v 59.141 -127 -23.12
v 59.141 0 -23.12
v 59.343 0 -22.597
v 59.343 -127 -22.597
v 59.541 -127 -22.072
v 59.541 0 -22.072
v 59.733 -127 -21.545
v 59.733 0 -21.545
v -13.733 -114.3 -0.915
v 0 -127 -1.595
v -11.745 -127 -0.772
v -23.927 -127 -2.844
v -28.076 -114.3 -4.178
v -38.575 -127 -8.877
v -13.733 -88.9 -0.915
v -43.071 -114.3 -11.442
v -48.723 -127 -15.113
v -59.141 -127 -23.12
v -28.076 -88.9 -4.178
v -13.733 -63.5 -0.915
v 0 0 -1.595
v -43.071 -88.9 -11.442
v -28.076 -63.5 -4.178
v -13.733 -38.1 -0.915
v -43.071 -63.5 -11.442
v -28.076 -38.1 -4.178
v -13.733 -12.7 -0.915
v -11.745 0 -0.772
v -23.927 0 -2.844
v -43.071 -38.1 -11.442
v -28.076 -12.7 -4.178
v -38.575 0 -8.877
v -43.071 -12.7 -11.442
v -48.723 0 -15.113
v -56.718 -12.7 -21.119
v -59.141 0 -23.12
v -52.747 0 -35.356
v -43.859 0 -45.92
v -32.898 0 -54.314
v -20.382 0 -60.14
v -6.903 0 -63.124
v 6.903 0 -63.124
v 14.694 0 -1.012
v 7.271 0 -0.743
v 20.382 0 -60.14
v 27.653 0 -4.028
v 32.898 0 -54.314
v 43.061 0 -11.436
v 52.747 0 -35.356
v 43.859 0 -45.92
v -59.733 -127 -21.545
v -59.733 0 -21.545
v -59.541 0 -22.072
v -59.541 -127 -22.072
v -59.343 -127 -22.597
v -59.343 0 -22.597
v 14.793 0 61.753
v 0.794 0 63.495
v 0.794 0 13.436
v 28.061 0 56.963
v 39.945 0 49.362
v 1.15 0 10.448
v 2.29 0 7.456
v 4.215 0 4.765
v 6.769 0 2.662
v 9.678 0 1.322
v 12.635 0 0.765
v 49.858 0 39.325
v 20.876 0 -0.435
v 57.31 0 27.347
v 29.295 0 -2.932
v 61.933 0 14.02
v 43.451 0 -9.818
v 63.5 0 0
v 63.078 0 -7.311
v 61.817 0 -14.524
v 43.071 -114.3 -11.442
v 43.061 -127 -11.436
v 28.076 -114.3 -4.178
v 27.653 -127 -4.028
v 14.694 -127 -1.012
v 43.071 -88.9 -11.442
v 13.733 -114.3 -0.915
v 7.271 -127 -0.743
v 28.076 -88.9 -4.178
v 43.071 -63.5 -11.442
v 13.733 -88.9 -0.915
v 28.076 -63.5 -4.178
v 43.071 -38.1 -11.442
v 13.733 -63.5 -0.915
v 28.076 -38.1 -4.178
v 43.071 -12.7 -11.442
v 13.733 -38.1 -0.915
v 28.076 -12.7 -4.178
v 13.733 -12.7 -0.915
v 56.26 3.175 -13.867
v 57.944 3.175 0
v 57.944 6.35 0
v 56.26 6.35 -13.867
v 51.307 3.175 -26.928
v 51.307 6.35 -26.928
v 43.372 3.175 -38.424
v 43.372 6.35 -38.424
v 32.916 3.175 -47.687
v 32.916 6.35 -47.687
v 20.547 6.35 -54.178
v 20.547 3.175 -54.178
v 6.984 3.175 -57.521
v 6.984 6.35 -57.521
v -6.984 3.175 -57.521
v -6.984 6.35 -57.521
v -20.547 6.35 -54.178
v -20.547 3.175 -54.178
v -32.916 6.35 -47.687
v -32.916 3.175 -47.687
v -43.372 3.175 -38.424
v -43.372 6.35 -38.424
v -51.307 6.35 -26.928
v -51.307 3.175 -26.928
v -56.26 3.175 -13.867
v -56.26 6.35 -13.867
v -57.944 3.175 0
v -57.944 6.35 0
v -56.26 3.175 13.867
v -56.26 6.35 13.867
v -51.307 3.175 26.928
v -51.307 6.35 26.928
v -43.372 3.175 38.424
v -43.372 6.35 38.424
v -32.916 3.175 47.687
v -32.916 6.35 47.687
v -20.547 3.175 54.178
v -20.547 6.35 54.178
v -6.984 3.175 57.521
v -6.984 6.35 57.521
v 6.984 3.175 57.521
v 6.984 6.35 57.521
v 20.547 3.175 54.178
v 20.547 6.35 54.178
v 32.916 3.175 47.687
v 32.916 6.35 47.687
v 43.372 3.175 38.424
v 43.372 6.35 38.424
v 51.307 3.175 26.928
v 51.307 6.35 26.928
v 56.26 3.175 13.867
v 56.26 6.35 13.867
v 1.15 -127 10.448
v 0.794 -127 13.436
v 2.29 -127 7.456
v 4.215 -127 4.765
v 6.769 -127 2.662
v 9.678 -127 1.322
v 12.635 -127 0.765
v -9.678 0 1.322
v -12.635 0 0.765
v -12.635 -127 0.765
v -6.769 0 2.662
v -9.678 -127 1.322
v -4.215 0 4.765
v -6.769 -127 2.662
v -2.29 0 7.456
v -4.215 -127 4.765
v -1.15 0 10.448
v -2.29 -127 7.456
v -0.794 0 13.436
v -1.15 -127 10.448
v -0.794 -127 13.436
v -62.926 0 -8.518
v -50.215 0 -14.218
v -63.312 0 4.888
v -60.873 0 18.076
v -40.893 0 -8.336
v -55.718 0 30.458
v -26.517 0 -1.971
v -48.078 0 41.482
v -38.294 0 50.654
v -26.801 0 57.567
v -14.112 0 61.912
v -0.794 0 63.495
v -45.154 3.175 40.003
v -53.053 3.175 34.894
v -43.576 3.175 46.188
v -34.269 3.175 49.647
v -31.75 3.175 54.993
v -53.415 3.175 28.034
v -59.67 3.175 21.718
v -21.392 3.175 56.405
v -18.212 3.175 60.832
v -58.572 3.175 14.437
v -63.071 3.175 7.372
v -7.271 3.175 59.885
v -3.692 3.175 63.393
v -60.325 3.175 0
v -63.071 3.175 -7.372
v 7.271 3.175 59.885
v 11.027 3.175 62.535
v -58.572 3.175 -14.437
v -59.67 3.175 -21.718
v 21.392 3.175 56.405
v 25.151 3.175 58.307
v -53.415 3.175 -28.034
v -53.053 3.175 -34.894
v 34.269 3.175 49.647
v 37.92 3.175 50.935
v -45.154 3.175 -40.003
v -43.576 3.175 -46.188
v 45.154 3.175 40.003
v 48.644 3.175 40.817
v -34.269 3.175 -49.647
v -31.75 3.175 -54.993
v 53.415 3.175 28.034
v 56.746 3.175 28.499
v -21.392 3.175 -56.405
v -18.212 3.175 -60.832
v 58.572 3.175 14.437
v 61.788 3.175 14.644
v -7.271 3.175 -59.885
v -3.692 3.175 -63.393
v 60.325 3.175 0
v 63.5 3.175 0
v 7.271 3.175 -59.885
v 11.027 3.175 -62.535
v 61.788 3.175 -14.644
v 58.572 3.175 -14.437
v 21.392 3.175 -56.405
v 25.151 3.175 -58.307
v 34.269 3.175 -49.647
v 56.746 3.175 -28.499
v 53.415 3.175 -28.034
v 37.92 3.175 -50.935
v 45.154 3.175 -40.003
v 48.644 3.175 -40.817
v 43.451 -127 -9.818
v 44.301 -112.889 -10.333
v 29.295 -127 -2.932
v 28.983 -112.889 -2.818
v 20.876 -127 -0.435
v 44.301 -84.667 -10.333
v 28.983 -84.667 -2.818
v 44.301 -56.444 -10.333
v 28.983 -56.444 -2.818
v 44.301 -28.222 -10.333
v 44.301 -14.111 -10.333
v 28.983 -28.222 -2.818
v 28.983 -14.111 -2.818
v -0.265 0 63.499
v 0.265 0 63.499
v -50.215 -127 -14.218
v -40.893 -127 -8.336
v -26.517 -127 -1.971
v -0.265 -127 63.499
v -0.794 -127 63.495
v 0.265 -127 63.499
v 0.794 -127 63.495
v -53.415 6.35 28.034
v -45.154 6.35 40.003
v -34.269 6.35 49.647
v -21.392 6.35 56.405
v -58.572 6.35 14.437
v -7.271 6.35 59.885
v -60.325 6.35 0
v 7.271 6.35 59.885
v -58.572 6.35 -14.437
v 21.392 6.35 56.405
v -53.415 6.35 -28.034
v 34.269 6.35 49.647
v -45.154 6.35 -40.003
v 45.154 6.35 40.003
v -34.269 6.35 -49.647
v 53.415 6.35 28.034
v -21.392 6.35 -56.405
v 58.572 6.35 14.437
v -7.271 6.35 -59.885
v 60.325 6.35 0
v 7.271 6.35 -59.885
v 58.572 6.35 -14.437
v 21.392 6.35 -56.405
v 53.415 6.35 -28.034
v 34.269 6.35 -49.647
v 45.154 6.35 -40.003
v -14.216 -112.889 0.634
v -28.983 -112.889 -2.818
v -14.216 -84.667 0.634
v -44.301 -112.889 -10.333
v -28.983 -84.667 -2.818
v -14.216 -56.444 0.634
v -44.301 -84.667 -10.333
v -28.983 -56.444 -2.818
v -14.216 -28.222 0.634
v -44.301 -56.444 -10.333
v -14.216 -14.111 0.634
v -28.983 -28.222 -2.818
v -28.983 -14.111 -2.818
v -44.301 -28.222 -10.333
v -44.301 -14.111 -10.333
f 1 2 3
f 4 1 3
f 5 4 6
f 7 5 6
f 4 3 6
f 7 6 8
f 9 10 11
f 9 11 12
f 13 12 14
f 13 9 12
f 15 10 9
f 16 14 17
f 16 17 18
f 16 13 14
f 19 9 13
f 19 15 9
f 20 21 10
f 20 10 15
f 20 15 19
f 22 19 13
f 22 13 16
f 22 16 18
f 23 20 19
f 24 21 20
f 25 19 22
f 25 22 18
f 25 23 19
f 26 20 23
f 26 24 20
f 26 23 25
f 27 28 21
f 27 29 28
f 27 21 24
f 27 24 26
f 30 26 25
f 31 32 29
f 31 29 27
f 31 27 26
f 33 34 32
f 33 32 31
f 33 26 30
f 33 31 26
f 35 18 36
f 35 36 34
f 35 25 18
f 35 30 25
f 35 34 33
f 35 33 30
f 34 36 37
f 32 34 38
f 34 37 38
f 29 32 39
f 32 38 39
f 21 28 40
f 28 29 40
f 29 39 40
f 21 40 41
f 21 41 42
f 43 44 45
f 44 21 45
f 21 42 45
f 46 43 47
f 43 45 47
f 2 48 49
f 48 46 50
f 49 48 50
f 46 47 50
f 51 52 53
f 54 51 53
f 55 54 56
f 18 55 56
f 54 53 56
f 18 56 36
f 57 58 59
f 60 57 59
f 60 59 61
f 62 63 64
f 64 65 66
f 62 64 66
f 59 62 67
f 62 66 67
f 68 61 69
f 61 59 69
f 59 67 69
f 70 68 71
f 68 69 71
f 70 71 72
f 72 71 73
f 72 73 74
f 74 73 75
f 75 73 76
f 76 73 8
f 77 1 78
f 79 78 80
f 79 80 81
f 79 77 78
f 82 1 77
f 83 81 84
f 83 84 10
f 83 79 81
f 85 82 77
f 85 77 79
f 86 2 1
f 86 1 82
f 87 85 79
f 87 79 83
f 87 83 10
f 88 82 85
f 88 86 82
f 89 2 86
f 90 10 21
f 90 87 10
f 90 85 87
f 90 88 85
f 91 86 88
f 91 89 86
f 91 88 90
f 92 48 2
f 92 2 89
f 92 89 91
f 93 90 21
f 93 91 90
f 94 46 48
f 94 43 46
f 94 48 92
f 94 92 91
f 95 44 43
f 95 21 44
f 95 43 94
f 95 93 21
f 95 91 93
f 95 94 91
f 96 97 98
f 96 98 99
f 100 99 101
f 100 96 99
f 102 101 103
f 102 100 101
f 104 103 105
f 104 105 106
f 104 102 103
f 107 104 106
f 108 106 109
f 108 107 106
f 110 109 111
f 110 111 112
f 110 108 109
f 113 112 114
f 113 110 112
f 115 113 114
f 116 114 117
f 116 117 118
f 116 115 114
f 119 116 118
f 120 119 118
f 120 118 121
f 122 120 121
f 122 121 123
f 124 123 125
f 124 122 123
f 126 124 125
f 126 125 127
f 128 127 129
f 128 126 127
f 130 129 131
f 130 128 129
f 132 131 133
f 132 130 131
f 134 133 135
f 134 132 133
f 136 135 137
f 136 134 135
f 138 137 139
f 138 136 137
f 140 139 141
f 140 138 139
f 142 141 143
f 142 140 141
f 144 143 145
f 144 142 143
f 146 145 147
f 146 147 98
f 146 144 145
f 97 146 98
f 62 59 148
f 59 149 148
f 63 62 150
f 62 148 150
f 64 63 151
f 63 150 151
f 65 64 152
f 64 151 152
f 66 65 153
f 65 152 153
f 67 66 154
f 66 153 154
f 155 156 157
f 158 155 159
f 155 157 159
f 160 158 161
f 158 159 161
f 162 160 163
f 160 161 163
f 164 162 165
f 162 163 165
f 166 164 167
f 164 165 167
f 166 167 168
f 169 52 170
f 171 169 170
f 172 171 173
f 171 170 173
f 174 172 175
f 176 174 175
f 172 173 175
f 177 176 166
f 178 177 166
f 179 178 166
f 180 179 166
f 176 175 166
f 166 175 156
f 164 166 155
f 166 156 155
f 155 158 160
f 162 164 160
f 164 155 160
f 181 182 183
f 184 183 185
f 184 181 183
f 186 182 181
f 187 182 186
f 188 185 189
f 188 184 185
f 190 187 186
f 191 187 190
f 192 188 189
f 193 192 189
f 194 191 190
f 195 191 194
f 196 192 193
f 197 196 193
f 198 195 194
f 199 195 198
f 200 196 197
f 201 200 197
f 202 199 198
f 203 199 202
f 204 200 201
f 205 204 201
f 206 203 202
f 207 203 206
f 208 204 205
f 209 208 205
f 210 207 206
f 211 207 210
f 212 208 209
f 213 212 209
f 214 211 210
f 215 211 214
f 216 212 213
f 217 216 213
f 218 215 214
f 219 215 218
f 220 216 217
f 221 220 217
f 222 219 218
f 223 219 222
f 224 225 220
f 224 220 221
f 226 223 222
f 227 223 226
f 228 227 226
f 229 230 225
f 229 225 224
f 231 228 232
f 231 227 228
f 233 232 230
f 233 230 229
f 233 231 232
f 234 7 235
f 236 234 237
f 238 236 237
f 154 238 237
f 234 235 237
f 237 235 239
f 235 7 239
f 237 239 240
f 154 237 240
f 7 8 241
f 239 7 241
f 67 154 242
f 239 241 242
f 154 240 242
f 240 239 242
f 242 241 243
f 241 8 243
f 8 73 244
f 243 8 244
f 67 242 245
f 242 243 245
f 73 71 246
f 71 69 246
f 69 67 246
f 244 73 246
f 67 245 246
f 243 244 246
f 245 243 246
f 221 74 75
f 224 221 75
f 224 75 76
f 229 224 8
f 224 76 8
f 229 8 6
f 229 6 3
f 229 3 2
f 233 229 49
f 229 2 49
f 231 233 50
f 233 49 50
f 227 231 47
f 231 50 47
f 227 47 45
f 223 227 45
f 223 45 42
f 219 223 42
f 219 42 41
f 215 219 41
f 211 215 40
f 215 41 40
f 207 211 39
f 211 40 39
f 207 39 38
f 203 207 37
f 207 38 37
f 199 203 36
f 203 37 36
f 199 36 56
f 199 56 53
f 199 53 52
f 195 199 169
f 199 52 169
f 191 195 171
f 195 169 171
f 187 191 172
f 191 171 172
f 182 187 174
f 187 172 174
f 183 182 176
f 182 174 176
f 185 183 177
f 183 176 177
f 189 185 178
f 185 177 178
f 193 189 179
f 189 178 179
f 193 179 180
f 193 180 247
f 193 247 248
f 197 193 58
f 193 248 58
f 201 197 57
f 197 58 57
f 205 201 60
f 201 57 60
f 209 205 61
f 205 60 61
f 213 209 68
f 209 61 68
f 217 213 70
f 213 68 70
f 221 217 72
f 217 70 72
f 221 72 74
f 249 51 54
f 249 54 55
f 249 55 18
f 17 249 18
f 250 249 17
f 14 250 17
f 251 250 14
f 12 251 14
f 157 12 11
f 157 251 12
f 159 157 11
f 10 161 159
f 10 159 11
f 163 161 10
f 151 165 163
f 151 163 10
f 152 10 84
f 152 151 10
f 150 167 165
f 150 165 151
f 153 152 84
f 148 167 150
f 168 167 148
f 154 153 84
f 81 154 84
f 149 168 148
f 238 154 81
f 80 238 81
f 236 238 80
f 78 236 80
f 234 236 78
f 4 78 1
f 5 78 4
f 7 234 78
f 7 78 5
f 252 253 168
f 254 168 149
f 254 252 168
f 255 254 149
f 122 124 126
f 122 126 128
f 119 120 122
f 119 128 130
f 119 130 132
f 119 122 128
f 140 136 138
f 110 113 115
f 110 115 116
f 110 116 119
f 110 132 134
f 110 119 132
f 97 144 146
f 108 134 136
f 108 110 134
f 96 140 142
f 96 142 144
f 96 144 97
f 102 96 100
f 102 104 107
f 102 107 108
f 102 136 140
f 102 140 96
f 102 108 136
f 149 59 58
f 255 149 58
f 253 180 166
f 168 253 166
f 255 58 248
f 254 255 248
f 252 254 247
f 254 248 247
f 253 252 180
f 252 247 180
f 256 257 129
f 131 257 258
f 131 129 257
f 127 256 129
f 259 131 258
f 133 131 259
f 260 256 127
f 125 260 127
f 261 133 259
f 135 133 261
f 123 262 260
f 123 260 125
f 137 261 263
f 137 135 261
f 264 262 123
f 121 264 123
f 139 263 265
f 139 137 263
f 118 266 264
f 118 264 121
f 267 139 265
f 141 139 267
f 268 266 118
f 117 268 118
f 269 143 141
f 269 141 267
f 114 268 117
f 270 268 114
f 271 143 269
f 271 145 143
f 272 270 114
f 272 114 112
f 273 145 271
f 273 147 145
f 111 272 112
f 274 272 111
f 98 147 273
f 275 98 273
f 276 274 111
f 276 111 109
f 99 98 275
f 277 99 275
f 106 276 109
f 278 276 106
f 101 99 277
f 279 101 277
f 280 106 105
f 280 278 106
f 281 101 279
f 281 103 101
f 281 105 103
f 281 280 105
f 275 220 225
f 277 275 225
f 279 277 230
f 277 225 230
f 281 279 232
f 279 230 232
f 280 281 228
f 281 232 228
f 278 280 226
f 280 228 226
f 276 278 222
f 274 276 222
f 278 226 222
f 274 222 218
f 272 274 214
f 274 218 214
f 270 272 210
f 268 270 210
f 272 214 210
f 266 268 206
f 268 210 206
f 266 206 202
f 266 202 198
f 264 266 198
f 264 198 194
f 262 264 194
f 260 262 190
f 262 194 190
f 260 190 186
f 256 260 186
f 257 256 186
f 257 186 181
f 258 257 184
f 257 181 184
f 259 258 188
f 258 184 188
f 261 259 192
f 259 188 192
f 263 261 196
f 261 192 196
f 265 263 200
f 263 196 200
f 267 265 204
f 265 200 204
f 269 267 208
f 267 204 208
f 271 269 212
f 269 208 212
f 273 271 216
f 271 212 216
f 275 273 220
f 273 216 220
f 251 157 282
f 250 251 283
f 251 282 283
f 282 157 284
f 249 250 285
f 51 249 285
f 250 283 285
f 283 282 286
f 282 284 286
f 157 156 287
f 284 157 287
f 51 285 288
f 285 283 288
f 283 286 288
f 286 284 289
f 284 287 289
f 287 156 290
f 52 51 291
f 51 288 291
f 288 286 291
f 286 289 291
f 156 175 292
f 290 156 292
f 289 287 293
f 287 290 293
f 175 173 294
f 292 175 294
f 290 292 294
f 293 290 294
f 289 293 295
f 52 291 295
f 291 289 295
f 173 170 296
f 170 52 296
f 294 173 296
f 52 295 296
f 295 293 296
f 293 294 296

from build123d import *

# Parameters (mm, degrees)
SKETCH1_R           = 63.5
BOSS_EXTRUDE1_DEPTH = 3.175
SKETCH2_R           = 60.325
SKETCH2_R_2         = 57.94375
BOSS_EXTRUDE2_DEPTH = 3.175
BOSS_EXTRUDE3_DEPTH = 127
FILLET1_R           = 12.7


with BuildPart() as part:
    # Sketch1 → Boss-Extrude1 (new body)
    with BuildSketch(Plane(origin=(0, 0, 0), x_dir=(1, 0, 0), z_dir=(0, 1, 0))):
        Circle(SKETCH1_R)
    extrude(amount=BOSS_EXTRUDE1_DEPTH)

    # Sketch2 → Boss-Extrude2 (add)
    with BuildSketch(Plane(origin=(0, 3.175, 0), x_dir=(1, 0, 0), z_dir=(0, 1, 0))):
        Circle(SKETCH2_R)
        Circle(SKETCH2_R_2, mode=Mode.SUBTRACT)
    extrude(amount=BOSS_EXTRUDE2_DEPTH)

    # Sketch3 → Boss-Extrude3 (add)
    with BuildSketch(Plane.XZ):
        with BuildLine():
            Line((-0.79375, 63.495038869), (-0.79375, 0.165767528))
            add(Edge.make_bspline(
                [(-0.79375, 0.165767528), (-5.19662587, 0.926394102), (-12.028294814, 1.162164763), (-21.507708178, -0.414484498), (-28.959628823, -2.648391287), (-36.549761029, -5.897616417), (-42.990474773, -9.452796753), (-48.210003566, -12.80329328), (-52.163993282, -15.574258653), (-55.991469214, -18.475868316), (-58.550879749, -20.554822593), (-59.733413602, -21.544588636)],
                knots=[0.02237317, 0.02237317, 0.02237317, 0.02237317, 0.257875777, 0.382709096, 0.507542415, 0.632375733, 0.757209052, 0.819625711, 0.882042371, 0.94445903, 1.000095669, 1.000095669, 1.000095669, 1.000095669], degree=3))
            ThreePointArc((-59.733413602, -21.544588636), (-59.442577848, -22.334501085), (-59.141296843, -23.120488916))
            add(Edge.make_bspline(
                [(0, -1.594817249), (-4.497680515, -0.712511058), (-11.342121161, -0.373927815), (-20.797455162, -1.88480643), (-28.048219709, -4.011073511), (-35.464551173, -7.138170569), (-41.780862519, -10.584133838), (-46.914506534, -13.847671974), (-50.8035363, -16.548272657), (-54.079771454, -19.012705913), (-56.859334031, -21.22174097), (-58.343356695, -22.447695352), (-59.141296843, -23.120488916)],
                knots=[0.002745404, 0.002745404, 0.002745404, 0.002745404, 0.252059053, 0.376715878, 0.501372702, 0.626029527, 0.750686351, 0.813014763, 0.875343176, 0.937671588, 0.968835794, 1.006875689, 1.006875689, 1.006875689, 1.006875689], degree=3))
            add(Edge.make_bspline(
                [(59.141296843, -23.120488916), (58.343356695, -22.447695352), (56.859334031, -21.22174097), (54.079771454, -19.012705913), (50.8035363, -16.548272657), (46.914506534, -13.847671974), (41.780862519, -10.584133838), (35.464551173, -7.138170569), (28.048219709, -4.011073511), (20.797455162, -1.88480643), (11.342121161, -0.373927815), (4.497680515, -0.712511058), (0, -1.594817249)],
                knots=[-0.004130285, -0.004130285, -0.004130285, -0.004130285, 0.03390961, 0.065073816, 0.127402229, 0.189730641, 0.252059053, 0.376715878, 0.501372702, 0.626029527, 0.750686351, 1, 1, 1, 1], degree=3))
            ThreePointArc((59.141296843, -23.120488916), (59.442577848, -22.334501085), (59.733413602, -21.544588636))
            add(Edge.make_bspline(
                [(59.733413602, -21.544588636), (58.550879749, -20.554822593), (55.991469214, -18.475868316), (52.163993282, -15.574258653), (48.210003566, -12.80329328), (42.990474773, -9.452796753), (36.549761029, -5.897616417), (28.959628823, -2.648391287), (21.507708178, -0.414484498), (12.028294814, 1.162164763), (5.19662587, 0.926394102), (0.79375, 0.165767528)],
                knots=[0.002649735, 0.002649735, 0.002649735, 0.002649735, 0.058286374, 0.120703033, 0.183119693, 0.245536352, 0.370369671, 0.495202989, 0.620036308, 0.744869627, 0.980372234, 0.980372234, 0.980372234, 0.980372234], degree=3))
            Line((0.79375, 0.165767528), (0.79375, 63.495038869))
            ThreePointArc((0.79375, 63.495038869), (0, 63.5), (-0.79375, 63.495038869))
        make_face()
    extrude(amount=BOSS_EXTRUDE3_DEPTH)

    # Fillet1
    fillet1_edges = [part.edges().sort_by_distance(p)[0] for p in [
        (0.79375, -63.5, 0.165767528),
        (-0.79375, -63.5, 0.165767528),
    ]]
    fillet(fillet1_edges, radius=FILLET1_R)


solid = part.part
